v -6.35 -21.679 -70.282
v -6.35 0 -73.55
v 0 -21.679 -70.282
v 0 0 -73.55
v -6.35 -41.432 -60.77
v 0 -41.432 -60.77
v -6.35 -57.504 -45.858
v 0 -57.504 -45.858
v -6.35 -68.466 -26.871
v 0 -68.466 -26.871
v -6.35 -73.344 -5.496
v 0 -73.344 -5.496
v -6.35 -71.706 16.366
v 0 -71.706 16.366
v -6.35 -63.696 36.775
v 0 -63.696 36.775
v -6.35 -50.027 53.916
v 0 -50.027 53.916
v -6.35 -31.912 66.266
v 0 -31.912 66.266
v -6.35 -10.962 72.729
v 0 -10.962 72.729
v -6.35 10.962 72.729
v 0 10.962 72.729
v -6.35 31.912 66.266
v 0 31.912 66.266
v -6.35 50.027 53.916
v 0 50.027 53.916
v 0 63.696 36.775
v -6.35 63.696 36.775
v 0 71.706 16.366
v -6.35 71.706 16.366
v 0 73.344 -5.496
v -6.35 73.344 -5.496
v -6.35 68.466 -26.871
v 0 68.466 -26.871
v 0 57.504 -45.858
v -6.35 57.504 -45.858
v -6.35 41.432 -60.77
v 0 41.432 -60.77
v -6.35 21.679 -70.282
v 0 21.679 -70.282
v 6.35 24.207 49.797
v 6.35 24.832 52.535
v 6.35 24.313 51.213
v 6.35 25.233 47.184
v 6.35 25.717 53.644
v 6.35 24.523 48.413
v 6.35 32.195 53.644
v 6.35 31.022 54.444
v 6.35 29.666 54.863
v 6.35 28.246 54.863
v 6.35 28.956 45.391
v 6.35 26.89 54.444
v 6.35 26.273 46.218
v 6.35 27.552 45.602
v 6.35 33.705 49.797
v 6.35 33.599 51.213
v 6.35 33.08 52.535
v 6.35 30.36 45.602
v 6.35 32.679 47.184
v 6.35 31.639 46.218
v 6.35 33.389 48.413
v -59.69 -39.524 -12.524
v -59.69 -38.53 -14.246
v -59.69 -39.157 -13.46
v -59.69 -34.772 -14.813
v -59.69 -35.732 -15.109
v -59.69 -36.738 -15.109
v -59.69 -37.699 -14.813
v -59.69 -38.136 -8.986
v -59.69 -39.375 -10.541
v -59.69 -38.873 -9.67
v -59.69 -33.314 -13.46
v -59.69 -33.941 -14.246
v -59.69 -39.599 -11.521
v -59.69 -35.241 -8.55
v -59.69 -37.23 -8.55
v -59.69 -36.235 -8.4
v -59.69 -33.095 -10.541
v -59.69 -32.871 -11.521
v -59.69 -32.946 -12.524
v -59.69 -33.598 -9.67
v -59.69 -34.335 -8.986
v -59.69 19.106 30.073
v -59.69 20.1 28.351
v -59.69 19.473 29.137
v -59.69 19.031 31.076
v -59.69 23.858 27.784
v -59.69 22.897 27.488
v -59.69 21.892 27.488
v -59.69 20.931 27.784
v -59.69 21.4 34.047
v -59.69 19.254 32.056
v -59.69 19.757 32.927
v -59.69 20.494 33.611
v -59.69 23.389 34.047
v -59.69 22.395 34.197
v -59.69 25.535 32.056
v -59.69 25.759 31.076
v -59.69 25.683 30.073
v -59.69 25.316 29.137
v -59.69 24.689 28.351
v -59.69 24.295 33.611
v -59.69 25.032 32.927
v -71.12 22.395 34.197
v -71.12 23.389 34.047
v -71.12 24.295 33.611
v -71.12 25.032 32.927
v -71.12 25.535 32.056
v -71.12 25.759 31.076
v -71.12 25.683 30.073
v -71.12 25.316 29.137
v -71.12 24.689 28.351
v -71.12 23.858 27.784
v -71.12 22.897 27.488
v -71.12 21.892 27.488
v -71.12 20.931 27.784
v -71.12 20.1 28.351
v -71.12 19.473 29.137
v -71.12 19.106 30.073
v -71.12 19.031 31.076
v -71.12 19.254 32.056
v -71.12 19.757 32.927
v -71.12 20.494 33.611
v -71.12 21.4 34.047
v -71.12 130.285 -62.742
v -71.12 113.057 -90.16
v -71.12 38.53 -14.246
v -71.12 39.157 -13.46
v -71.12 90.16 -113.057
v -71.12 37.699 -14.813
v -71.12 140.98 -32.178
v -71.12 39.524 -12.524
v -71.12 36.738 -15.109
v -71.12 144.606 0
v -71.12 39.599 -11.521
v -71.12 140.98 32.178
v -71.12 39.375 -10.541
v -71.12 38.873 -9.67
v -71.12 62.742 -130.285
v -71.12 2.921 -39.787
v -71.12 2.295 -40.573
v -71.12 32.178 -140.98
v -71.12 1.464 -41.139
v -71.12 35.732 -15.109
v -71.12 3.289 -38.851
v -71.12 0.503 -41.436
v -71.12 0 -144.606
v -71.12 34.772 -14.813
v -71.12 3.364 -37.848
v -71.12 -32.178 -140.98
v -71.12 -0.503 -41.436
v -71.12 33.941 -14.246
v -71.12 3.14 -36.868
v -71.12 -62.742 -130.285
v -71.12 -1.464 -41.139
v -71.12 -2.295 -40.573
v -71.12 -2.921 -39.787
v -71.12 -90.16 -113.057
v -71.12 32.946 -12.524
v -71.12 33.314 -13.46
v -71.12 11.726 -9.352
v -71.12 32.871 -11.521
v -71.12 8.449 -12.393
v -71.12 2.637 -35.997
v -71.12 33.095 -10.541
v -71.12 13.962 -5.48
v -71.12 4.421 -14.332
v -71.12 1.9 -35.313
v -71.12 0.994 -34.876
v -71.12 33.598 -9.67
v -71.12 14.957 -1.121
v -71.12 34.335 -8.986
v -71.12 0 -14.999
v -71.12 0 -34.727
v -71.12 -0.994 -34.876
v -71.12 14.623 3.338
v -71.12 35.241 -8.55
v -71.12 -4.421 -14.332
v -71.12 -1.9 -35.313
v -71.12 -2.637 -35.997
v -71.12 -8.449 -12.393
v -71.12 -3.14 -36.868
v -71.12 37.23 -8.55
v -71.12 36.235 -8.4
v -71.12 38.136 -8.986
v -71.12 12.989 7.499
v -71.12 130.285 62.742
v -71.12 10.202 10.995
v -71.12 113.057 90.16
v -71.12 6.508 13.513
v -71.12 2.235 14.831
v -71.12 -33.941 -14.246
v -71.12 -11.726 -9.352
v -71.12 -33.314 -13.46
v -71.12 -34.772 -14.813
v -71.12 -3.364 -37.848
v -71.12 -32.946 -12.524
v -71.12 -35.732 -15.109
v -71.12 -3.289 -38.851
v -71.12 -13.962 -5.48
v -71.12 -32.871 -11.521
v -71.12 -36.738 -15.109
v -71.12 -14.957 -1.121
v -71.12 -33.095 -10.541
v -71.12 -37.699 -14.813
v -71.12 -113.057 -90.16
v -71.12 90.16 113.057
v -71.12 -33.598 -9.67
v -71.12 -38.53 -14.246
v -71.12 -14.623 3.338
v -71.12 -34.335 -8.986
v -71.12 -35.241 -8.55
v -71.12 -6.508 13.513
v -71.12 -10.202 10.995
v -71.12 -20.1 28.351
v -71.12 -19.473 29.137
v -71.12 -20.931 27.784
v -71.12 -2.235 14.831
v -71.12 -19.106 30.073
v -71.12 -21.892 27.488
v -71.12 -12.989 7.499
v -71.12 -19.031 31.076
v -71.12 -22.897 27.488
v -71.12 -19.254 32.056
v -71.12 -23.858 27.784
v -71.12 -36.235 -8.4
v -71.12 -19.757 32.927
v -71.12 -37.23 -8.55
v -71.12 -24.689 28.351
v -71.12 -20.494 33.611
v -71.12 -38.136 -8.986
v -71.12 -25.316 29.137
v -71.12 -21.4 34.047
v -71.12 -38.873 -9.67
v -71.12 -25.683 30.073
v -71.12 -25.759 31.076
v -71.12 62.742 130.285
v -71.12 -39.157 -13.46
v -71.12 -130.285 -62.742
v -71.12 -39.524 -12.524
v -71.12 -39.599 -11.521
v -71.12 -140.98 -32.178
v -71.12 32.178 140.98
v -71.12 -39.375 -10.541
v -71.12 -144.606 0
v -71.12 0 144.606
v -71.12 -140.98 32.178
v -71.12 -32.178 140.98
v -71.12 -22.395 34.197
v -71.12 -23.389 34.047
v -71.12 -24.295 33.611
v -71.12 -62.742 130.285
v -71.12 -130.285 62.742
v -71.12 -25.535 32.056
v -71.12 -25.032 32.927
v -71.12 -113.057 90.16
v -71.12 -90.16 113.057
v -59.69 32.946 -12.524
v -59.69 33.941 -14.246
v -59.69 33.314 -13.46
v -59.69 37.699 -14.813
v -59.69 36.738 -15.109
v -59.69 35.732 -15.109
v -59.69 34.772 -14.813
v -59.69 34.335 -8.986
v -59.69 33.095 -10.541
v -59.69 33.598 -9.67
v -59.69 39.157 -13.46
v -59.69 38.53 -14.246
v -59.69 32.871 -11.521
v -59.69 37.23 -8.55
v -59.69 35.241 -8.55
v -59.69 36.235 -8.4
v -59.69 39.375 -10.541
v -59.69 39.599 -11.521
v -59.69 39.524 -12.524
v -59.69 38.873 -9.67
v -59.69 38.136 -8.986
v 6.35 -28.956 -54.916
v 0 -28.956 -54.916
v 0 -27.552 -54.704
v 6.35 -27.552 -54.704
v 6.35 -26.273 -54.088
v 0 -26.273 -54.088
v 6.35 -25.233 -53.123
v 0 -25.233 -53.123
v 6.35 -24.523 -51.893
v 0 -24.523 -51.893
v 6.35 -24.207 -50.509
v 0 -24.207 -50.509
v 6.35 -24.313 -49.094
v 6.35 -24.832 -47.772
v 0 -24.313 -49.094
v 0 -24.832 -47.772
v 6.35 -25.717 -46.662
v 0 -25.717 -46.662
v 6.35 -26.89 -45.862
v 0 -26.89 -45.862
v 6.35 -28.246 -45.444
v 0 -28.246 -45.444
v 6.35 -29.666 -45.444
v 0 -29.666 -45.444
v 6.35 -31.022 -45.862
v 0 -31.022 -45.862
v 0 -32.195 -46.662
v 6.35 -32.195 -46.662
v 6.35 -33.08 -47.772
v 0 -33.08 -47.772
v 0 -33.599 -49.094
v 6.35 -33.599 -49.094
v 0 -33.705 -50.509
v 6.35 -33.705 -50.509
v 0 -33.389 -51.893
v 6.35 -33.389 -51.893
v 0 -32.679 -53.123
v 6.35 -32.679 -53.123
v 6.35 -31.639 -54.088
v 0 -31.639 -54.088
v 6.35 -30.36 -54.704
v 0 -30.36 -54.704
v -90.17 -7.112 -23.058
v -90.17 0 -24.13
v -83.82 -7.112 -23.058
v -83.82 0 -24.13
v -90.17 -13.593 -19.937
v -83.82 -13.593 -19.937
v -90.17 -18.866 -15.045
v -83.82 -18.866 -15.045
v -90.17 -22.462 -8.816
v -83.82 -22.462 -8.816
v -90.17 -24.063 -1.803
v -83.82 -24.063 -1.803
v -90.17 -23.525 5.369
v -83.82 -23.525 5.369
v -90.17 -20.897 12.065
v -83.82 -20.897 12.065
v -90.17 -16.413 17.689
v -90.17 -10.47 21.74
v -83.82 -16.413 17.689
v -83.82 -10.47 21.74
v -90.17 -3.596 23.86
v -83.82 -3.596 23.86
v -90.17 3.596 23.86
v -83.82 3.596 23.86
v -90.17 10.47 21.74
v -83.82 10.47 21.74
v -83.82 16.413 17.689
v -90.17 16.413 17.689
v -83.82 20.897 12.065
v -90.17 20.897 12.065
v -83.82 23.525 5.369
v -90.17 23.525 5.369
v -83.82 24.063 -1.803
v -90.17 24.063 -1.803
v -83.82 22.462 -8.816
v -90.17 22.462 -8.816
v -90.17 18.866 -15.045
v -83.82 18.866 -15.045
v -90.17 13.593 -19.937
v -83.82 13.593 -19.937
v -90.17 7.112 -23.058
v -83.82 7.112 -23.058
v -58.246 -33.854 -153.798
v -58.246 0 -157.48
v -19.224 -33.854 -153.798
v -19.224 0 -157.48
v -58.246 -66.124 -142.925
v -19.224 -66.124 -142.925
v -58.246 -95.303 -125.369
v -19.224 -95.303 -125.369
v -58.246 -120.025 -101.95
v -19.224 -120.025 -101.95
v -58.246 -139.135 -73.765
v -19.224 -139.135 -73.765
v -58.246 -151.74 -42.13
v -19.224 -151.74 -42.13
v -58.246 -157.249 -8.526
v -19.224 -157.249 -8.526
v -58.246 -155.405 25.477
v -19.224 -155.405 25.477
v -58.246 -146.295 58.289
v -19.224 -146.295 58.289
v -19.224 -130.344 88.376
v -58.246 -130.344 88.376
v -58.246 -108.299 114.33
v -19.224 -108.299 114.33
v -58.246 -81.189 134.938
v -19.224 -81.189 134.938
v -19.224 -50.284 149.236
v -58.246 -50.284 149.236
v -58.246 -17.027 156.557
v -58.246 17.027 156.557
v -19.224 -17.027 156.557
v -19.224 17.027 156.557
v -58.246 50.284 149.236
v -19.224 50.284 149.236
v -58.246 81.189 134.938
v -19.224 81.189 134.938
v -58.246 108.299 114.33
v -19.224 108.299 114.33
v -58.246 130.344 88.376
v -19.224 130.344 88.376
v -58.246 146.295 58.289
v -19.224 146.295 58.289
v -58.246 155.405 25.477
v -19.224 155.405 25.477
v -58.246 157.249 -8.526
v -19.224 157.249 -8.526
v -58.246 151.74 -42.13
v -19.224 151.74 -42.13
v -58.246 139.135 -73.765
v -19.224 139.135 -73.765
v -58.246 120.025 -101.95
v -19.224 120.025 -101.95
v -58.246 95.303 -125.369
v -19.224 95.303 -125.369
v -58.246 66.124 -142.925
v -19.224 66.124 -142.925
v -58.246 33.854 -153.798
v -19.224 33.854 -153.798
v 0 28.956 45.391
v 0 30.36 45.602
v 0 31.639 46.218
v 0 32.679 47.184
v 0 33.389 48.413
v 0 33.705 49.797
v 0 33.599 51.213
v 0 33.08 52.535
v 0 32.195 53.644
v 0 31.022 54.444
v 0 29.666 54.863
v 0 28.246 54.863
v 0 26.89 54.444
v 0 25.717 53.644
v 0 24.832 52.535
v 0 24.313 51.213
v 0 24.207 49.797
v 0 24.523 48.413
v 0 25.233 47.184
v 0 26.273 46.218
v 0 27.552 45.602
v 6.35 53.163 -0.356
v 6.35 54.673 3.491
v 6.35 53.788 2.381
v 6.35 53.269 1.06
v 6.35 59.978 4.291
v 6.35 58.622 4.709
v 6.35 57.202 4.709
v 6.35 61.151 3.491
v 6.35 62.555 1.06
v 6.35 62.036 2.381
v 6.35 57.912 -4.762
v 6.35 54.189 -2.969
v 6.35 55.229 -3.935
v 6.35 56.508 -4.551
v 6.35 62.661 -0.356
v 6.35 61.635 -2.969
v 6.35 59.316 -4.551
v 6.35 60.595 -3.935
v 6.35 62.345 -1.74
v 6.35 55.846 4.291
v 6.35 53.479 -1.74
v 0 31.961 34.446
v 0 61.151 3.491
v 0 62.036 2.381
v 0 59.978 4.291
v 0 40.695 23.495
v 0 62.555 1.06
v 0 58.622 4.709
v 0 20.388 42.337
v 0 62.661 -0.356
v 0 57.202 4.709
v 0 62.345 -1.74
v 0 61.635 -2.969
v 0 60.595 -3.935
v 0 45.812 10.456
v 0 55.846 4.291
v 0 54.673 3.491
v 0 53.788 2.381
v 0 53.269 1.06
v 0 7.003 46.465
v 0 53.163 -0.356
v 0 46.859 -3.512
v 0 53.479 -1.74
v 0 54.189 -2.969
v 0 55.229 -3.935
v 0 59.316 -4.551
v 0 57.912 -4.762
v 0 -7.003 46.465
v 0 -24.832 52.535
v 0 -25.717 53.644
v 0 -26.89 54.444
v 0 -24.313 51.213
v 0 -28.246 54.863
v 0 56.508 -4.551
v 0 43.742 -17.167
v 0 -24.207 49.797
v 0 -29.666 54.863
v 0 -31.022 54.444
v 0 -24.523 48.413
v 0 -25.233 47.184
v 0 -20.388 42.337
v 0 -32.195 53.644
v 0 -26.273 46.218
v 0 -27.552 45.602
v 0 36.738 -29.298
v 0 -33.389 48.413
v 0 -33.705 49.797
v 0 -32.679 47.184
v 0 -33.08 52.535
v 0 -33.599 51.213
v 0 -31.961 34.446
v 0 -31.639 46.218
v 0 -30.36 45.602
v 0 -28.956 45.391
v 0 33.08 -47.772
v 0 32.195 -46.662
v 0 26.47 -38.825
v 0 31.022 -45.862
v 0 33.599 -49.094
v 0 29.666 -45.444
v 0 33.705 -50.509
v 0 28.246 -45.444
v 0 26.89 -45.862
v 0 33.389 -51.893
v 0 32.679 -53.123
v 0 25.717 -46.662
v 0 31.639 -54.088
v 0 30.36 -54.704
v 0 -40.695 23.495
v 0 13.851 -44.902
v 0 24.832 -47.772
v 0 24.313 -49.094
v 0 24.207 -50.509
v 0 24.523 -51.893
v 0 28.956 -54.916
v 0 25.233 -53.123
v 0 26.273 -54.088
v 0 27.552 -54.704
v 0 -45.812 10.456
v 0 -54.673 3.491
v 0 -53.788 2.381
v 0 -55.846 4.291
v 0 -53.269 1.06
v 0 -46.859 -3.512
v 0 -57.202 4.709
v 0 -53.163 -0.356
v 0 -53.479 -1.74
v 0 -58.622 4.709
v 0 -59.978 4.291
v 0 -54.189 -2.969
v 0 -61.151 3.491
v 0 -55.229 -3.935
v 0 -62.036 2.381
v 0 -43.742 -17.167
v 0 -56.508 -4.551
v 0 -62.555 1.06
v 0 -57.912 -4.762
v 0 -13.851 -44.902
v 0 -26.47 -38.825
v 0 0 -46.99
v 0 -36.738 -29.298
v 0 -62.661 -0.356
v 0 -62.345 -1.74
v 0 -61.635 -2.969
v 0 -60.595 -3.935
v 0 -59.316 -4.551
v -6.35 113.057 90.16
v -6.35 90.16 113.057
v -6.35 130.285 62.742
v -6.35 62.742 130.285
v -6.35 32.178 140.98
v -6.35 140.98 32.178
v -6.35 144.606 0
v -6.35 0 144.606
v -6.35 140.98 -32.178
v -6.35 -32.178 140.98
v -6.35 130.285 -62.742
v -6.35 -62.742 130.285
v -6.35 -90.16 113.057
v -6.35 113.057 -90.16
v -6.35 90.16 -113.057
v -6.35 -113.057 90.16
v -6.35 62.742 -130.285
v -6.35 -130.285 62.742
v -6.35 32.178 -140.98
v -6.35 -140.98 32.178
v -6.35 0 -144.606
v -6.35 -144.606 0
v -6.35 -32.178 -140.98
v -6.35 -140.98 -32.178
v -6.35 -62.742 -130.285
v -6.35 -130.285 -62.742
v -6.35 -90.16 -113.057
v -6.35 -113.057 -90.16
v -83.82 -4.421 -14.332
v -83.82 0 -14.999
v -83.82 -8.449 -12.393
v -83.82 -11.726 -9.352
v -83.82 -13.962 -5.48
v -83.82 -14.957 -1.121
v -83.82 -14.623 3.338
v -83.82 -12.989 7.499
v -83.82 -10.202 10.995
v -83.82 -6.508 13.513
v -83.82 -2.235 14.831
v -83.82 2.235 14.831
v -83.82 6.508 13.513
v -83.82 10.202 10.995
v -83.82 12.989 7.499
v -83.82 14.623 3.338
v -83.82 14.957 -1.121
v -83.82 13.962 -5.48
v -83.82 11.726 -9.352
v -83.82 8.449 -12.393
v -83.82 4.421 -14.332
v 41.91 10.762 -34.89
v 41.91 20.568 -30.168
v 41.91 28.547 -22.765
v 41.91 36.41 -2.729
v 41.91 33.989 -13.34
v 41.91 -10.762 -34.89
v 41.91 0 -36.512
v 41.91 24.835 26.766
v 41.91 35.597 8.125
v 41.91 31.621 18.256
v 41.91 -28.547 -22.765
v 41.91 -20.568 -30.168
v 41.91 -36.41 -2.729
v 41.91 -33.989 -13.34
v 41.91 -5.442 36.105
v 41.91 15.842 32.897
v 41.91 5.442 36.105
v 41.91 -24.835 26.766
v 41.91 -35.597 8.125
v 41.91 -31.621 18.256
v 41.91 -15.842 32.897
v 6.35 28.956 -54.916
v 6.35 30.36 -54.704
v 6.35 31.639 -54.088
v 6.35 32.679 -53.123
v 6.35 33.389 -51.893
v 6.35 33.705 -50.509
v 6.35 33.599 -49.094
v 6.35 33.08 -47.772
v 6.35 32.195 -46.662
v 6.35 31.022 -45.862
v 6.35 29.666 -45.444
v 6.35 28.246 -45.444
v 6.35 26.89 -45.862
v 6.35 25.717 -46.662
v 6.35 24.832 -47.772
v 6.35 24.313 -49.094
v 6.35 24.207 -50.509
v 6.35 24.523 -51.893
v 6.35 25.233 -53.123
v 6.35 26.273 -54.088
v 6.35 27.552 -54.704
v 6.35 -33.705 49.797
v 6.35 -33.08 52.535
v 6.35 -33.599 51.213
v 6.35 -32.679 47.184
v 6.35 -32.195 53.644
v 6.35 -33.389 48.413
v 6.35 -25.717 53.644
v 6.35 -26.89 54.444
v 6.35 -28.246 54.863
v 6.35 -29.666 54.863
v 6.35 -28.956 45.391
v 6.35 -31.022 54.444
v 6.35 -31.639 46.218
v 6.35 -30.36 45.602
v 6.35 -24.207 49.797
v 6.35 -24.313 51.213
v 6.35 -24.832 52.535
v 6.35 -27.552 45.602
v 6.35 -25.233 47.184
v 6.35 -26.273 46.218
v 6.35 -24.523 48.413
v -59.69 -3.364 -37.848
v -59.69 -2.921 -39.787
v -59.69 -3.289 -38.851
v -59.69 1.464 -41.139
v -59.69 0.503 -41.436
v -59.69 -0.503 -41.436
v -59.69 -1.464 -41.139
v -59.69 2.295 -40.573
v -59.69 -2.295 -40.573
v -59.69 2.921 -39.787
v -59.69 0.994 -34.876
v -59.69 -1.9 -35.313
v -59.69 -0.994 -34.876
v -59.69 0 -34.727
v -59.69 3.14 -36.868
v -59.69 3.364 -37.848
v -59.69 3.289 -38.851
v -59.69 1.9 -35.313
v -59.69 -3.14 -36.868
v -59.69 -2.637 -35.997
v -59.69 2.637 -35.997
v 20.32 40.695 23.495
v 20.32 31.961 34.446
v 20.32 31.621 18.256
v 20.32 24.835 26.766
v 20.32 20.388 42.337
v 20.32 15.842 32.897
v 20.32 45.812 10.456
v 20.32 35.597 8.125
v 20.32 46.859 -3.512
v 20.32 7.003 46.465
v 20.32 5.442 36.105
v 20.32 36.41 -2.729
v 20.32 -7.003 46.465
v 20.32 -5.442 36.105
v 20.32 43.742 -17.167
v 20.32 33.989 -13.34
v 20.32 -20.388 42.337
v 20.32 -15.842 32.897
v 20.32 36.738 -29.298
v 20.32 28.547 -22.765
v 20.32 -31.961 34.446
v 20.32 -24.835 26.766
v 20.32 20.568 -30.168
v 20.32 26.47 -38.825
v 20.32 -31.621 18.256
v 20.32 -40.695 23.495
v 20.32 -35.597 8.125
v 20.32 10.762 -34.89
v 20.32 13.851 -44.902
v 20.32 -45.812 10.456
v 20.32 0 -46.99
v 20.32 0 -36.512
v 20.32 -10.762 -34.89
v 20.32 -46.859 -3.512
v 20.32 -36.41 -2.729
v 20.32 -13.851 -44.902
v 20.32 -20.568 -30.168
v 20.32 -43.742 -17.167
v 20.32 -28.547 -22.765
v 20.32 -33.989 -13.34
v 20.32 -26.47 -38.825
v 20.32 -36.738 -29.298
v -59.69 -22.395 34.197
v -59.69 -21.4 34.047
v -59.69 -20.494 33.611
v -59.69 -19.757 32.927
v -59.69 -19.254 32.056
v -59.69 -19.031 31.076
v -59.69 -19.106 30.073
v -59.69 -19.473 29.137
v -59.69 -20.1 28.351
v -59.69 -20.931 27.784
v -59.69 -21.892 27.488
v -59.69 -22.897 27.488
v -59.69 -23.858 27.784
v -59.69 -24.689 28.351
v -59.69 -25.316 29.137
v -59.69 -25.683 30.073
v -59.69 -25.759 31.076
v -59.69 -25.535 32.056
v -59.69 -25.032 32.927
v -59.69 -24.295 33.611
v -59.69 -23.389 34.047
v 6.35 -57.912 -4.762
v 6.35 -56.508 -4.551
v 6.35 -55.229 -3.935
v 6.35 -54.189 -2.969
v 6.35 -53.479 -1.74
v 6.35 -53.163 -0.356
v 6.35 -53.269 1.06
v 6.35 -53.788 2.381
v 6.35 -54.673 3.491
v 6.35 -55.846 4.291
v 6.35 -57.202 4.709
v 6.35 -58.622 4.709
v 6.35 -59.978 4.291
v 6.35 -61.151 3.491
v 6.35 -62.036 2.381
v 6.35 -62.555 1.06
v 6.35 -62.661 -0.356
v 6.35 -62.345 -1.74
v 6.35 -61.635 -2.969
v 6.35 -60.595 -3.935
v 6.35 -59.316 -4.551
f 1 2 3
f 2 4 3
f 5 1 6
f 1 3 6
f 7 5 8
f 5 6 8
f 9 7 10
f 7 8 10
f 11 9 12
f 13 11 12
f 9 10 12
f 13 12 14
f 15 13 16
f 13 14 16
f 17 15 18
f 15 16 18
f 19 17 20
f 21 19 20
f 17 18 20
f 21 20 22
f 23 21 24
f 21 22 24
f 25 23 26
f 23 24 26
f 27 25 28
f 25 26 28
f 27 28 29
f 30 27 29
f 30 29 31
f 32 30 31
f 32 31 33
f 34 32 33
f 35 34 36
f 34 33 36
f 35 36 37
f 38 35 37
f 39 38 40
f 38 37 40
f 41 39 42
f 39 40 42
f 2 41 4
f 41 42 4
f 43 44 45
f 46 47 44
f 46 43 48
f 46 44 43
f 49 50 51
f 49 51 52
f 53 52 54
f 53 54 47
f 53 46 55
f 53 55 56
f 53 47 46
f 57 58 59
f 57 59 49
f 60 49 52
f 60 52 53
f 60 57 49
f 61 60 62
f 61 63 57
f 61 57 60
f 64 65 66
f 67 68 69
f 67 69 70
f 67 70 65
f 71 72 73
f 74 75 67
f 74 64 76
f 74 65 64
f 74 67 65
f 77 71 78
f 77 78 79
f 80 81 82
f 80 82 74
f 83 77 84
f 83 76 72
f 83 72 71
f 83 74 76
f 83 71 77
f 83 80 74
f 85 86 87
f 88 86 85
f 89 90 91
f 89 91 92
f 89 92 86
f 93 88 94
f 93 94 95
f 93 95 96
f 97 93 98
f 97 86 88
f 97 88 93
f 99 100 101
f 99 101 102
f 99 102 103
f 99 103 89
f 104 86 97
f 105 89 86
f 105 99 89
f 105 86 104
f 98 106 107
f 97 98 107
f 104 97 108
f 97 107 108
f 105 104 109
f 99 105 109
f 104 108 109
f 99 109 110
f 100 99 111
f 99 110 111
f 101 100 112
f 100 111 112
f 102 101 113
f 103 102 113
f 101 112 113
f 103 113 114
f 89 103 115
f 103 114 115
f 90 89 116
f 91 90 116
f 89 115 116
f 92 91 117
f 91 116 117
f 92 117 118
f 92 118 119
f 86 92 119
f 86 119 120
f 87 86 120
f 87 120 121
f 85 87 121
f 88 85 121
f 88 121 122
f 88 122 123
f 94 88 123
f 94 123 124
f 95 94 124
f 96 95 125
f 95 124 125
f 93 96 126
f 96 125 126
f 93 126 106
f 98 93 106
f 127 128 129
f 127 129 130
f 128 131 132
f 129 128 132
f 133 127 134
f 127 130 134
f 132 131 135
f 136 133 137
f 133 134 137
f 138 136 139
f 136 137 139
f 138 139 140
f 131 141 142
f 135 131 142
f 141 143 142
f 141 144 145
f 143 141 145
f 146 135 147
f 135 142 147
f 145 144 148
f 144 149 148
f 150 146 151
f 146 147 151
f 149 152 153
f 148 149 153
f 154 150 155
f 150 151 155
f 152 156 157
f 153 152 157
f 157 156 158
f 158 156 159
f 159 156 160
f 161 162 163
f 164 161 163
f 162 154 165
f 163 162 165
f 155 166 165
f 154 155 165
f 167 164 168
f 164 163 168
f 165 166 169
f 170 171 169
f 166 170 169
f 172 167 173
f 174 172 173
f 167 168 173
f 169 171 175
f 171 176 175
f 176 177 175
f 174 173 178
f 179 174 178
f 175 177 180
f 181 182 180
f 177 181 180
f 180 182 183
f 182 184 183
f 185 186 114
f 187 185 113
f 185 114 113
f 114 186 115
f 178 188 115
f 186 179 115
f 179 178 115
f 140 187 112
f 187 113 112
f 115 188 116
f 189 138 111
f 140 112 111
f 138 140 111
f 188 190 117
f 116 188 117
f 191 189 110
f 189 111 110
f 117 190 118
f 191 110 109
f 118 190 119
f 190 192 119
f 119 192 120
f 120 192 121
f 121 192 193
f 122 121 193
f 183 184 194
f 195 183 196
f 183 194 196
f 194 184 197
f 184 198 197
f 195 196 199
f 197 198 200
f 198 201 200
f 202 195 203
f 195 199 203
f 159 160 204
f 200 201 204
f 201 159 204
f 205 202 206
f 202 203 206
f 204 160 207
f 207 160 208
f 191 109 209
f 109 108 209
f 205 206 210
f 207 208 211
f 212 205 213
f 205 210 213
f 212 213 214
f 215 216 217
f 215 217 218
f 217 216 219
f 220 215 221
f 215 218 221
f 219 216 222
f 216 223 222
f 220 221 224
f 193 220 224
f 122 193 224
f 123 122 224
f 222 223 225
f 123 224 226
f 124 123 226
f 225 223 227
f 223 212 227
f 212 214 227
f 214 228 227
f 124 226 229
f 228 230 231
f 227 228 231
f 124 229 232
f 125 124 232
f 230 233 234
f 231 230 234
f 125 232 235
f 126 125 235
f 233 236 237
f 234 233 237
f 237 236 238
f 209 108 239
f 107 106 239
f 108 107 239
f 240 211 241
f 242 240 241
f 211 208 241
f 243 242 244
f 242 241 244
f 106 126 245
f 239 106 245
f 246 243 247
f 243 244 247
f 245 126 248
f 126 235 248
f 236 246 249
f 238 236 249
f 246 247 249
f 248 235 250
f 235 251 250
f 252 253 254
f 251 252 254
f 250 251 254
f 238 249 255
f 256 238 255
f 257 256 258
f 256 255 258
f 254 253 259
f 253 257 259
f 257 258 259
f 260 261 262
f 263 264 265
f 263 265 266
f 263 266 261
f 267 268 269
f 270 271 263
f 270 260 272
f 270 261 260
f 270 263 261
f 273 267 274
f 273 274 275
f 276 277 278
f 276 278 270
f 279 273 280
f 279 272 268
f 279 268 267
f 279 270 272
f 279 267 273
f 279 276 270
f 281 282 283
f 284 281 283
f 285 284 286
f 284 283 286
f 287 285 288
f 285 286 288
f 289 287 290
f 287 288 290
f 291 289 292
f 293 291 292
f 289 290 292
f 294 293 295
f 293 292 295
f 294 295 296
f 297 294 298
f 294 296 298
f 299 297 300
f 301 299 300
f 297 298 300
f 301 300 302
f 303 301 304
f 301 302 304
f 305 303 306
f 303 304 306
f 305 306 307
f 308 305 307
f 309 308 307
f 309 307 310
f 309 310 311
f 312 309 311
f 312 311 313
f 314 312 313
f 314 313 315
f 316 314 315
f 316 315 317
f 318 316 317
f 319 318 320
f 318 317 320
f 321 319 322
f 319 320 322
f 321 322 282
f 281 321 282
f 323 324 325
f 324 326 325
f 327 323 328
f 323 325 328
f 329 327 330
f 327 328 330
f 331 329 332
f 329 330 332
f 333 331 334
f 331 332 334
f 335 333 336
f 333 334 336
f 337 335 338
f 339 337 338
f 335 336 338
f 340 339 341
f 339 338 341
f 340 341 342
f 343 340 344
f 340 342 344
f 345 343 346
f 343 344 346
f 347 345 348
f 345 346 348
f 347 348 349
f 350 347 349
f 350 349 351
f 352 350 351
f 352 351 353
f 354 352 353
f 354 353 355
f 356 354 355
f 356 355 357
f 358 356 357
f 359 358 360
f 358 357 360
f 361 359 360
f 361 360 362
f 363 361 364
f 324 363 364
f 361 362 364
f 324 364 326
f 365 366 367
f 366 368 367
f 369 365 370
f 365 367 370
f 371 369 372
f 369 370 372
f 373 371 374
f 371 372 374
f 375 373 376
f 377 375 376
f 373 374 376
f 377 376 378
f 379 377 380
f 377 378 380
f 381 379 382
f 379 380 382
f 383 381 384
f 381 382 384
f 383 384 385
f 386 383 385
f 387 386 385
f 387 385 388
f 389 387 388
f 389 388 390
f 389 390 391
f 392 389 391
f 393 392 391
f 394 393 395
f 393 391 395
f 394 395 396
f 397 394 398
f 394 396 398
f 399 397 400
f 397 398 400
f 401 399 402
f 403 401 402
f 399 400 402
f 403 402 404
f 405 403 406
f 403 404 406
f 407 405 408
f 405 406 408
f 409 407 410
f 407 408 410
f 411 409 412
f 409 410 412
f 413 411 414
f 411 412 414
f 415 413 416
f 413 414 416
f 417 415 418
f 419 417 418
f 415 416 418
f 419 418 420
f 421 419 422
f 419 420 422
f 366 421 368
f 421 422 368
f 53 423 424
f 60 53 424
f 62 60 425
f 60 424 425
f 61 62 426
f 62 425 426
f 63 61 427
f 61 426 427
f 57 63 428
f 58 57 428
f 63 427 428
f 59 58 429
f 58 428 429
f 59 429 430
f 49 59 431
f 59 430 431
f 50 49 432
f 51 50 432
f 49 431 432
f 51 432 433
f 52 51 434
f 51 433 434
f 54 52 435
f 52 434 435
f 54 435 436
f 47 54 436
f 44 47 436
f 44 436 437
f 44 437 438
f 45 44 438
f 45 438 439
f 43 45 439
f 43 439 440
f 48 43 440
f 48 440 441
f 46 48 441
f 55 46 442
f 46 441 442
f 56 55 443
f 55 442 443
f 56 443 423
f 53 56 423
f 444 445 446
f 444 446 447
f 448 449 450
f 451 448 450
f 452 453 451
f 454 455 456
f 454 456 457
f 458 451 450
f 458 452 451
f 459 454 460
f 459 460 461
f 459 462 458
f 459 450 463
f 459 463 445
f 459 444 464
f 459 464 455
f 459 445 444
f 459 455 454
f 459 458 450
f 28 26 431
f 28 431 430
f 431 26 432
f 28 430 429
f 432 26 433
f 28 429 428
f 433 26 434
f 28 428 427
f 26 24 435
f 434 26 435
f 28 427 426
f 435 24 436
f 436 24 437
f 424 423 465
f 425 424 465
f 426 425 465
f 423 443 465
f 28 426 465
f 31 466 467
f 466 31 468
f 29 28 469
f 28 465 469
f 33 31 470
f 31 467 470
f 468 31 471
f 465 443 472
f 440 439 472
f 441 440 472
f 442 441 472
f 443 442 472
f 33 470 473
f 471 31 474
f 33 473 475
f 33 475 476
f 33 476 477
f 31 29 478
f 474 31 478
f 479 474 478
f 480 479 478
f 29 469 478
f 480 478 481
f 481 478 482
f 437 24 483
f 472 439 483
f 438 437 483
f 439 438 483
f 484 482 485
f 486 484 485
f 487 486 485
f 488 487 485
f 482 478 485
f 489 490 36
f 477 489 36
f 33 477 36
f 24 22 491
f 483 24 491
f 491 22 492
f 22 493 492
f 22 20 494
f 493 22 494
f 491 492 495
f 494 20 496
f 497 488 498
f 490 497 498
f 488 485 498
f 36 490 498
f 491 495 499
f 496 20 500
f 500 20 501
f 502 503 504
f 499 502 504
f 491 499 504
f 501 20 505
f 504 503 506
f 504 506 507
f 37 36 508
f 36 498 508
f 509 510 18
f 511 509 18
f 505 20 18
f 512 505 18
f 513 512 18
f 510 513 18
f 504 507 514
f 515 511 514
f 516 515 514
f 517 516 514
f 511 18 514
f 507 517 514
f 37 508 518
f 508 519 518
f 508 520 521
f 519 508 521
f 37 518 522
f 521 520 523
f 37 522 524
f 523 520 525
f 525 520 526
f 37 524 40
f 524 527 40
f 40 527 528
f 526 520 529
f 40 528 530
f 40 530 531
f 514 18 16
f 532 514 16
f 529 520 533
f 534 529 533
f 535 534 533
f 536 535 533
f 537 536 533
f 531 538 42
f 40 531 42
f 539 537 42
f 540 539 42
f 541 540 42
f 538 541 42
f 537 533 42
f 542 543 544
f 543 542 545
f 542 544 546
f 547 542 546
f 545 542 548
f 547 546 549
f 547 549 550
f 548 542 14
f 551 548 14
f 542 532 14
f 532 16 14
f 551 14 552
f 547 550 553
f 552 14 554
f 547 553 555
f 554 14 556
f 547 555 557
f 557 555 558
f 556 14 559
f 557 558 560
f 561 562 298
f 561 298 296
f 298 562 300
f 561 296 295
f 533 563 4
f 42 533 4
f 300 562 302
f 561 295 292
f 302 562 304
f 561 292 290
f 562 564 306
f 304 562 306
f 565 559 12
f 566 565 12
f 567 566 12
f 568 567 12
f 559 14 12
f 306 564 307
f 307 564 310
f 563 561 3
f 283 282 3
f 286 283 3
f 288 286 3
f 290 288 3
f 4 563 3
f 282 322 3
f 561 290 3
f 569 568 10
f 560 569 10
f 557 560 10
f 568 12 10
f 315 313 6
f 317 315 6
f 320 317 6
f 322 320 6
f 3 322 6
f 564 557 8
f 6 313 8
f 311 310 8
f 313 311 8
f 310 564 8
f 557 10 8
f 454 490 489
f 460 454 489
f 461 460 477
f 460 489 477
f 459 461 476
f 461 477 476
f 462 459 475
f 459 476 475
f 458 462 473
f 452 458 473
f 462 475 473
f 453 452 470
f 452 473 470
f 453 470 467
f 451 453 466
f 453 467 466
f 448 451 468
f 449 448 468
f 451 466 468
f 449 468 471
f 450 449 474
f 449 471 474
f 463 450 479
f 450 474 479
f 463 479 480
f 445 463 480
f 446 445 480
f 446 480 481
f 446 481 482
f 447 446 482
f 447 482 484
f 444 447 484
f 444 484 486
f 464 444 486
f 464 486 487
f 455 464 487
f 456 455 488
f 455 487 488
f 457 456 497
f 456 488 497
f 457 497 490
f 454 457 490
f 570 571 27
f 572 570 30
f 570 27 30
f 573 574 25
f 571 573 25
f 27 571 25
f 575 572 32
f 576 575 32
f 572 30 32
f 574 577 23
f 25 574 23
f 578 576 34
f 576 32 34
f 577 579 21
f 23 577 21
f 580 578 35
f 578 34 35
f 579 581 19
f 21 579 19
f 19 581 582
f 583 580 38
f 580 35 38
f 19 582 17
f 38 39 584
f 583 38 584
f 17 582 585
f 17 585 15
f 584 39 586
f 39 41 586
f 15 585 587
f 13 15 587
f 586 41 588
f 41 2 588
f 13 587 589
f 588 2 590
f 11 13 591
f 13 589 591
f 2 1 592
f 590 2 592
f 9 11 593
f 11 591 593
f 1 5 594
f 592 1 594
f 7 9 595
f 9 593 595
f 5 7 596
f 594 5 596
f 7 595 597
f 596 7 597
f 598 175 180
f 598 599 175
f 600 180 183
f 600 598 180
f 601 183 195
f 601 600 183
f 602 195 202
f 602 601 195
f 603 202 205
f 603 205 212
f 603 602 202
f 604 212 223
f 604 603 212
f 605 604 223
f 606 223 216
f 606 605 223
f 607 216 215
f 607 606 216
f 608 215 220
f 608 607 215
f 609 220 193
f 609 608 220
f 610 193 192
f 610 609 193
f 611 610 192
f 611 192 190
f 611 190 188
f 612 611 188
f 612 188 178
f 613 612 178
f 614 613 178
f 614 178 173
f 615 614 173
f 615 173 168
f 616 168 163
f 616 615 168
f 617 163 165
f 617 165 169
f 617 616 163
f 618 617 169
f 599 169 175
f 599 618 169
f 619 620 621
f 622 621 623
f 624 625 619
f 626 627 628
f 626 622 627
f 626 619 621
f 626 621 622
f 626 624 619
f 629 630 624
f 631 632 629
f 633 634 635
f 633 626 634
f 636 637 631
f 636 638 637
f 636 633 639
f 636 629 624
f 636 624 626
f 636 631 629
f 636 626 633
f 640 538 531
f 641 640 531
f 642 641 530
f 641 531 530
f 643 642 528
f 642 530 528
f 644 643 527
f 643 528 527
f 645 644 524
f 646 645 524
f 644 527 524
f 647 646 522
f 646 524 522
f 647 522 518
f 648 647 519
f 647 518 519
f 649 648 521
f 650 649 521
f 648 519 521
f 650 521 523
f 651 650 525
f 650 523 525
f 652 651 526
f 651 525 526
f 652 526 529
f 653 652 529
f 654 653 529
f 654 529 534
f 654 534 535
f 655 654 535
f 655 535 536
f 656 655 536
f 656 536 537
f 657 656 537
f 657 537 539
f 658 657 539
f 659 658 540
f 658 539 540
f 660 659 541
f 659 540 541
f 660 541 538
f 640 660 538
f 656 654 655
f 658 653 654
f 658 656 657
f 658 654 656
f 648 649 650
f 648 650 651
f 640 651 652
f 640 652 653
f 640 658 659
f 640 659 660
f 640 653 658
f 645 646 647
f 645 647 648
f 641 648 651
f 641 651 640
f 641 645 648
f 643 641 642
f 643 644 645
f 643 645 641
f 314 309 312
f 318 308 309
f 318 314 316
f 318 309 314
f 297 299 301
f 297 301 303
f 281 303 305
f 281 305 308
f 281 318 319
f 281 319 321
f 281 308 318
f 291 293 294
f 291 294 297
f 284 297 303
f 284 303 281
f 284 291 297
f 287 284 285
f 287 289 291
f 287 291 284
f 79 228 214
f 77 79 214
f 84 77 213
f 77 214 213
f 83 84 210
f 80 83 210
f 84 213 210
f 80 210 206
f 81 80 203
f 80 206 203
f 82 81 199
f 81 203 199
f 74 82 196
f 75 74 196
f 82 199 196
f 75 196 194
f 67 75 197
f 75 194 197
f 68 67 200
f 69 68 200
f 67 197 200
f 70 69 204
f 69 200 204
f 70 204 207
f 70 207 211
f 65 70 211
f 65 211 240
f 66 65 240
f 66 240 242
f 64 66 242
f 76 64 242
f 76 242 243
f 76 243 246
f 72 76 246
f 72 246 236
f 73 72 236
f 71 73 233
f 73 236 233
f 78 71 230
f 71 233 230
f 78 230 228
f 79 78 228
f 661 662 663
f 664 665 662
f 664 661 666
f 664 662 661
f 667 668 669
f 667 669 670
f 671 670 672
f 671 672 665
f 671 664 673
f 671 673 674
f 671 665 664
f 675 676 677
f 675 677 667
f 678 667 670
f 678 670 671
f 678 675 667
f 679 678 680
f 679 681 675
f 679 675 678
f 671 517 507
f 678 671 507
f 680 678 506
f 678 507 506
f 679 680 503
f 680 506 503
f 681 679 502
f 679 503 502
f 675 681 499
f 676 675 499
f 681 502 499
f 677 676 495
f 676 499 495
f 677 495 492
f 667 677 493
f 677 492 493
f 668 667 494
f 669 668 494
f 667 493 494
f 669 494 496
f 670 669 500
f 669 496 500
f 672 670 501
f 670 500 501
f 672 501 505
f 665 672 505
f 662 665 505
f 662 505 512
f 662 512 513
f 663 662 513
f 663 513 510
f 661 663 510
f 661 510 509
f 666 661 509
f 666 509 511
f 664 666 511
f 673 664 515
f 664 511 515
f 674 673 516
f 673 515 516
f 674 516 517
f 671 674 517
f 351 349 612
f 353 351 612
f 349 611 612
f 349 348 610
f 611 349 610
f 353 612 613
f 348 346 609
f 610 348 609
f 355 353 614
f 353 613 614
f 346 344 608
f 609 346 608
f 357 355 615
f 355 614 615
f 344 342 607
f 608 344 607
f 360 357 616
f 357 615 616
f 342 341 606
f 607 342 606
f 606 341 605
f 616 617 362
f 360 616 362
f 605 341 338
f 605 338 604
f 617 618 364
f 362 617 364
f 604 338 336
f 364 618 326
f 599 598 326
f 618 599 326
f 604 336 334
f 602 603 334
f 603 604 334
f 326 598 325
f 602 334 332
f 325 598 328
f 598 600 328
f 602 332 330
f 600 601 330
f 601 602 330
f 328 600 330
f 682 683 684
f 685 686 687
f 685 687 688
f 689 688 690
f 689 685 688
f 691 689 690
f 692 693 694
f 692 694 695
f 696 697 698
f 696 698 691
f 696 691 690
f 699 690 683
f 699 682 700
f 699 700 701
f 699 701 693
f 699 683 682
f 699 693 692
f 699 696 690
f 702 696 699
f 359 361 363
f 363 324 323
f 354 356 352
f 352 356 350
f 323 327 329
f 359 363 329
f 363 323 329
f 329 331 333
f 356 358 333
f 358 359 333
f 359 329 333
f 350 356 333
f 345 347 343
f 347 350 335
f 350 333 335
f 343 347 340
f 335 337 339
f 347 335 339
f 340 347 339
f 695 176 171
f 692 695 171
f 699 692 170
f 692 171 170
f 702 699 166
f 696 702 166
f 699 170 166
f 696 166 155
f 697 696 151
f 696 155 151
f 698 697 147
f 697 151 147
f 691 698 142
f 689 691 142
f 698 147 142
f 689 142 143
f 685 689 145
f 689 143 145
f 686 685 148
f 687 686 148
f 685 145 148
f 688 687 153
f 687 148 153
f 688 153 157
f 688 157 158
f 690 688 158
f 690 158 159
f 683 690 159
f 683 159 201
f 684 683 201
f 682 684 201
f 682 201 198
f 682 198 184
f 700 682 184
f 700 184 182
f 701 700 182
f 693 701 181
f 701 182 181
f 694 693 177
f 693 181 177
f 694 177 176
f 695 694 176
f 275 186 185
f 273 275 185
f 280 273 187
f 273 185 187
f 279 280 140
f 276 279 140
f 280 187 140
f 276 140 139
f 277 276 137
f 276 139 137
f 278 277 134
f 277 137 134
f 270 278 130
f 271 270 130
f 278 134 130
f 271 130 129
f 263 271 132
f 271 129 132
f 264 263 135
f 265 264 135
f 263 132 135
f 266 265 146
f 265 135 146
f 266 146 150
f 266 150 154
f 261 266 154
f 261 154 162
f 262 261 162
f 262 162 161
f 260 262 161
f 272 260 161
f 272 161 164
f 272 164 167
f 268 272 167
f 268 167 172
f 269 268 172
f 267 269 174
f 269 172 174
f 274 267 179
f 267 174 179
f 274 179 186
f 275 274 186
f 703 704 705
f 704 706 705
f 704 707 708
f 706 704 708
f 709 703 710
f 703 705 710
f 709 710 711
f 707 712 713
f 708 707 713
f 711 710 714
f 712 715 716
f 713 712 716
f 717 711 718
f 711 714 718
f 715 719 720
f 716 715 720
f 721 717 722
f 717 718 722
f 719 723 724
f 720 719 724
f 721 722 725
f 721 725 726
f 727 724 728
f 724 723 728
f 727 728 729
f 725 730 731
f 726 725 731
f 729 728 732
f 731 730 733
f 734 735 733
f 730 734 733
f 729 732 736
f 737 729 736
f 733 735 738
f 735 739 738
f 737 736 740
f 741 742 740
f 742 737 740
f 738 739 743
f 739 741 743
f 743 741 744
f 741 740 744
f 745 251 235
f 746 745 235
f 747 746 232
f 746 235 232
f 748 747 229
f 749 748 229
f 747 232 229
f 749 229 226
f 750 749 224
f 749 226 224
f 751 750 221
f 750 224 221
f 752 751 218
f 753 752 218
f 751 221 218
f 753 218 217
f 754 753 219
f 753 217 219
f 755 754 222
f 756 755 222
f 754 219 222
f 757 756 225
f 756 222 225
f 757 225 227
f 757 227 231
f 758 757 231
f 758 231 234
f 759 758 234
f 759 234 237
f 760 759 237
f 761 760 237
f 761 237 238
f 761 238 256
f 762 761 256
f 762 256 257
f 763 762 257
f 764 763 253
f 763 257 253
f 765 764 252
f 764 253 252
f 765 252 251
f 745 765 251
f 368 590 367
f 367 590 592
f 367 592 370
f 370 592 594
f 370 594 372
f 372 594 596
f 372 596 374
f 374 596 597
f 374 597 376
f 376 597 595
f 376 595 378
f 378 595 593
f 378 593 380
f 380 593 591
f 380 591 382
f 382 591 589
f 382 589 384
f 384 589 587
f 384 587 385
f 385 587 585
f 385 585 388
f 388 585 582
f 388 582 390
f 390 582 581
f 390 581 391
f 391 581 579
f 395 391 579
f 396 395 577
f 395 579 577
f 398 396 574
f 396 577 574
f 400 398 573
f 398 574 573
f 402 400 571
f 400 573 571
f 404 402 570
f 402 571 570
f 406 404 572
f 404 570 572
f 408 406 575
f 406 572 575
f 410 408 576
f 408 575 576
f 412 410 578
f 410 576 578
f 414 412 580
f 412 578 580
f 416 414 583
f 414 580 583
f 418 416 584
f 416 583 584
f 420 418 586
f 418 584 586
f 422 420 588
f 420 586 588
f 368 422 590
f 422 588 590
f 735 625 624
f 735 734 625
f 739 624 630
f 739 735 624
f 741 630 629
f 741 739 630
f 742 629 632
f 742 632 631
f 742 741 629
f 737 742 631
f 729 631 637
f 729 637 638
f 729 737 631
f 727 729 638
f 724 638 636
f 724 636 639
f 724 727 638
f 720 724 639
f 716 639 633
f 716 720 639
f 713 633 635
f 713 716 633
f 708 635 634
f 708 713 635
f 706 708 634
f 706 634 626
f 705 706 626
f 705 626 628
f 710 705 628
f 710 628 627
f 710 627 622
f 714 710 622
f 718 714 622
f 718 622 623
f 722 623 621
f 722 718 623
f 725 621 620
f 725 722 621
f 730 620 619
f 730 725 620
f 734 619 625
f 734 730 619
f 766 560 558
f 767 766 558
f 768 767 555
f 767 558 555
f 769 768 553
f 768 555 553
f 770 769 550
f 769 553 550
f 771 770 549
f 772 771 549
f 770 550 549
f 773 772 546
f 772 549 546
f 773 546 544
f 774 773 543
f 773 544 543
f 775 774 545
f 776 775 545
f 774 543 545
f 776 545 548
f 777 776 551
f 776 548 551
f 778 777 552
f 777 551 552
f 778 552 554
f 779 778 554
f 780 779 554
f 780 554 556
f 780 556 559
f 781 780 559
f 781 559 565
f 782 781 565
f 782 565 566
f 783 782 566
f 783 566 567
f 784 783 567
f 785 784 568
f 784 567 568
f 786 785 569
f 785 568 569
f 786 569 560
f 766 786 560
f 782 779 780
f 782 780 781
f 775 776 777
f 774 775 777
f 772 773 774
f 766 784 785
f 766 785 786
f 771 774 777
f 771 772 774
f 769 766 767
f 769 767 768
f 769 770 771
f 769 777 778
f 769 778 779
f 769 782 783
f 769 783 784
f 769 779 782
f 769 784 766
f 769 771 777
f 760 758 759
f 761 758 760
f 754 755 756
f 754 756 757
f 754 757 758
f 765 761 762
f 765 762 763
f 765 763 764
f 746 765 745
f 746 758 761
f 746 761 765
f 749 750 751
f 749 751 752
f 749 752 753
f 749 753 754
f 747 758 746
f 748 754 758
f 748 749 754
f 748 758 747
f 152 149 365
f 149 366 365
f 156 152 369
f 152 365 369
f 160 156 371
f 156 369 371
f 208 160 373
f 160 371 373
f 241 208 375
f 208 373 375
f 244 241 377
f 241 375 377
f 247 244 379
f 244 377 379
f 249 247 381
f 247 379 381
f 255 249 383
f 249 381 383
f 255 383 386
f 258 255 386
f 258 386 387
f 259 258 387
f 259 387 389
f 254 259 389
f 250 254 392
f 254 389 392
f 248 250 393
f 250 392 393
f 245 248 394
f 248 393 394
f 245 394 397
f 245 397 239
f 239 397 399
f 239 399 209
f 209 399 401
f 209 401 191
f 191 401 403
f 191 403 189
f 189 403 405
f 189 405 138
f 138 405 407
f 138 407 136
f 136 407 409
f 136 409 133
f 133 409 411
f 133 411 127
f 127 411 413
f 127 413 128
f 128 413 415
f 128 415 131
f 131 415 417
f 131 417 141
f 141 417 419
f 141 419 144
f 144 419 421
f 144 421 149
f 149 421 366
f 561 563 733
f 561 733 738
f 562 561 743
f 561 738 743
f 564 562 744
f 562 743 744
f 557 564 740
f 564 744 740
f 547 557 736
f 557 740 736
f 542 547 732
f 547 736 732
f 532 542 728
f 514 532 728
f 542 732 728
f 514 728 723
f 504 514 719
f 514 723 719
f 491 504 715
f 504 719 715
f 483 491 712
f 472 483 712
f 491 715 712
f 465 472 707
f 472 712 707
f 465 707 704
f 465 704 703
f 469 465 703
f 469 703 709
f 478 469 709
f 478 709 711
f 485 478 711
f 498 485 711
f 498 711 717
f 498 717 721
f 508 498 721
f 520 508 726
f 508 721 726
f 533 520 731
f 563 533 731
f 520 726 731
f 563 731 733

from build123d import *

# Parameters (mm, degrees)
SKETCH1_W           = 12.7
SKETCH1_H           = 14.9987
SKETCH1_W_2         = 21.59
SKETCH1_H_2         = 36.5125
SKETCH3_R           = 3.3734375
CUT_EXTRUDE1_DEPTH  = 11.43
SKETCH5_R           = 4.7625
BOSS_EXTRUDE1_DEPTH = 6.35


with BuildPart() as part:
    # Sketch1 → Revolve1 (revolve)
    with BuildSketch(Plane(origin=(0, 0, 0), x_dir=(-1, 0, 0), z_dir=(0, 1, 0)), mode=Mode.PRIVATE) as revolve1_sk:
        Polygon((0, 0), (0, 46.99), (-20.32, 46.99), (-20.32, 36.5125), (-20.32, 0), align=None)
        Polygon((6.35, 73.550123262), (0, 73.550123262), (0, 46.99), (0, 0), (71.12, 0), (71.12, 14.9987), (71.12, 144.605660924), (58.245660924, 157.48), (19.224339076, 157.48), (6.35, 144.605660924), align=None)
        with Locations((77.47, 7.49935)):
            Rectangle(SKETCH1_W, SKETCH1_H)
        Polygon((83.82, 14.9987), (83.82, 0), (90.17, 0), (90.17, 24.13), (83.82, 24.13), align=None)
        with Locations((-31.115, 18.25625)):
            Rectangle(SKETCH1_W_2, SKETCH1_H_2)
    revolve(revolve1_sk.sketch.rotate(Axis((0, 0, 0), (-1, 0, 0)), 180), axis=Axis((0, 0, 0), (-1, 0, 0)))

    # Sketch3 → Cut-Extrude1 (cut)
    with BuildSketch(Plane(origin=(-71.12, 0, 0), x_dir=(0, -1, 0), z_dir=(-1, 0, 0))):
        with Locations(Location((-22.394618112, 30.823547486, 0), (0, 0, 90))):
            Circle(SKETCH3_R)
        with Locations(Location((22.394618112, 30.823547486, 0), (0, 0, 90))):
            Circle(SKETCH3_R)
        with Locations(Location((36.235253271, -11.773547486, 0), (0, 0, 90))):
            Circle(SKETCH3_R)
        with Locations(Location((0, -38.1, 0), (0, 0, 90))):
            Circle(SKETCH3_R)
        with Locations(Location((-36.235253271, -11.773547486, 0), (0, 0, 90))):
            Circle(SKETCH3_R)
    extrude(amount=-CUT_EXTRUDE1_DEPTH, mode=Mode.SUBTRACT)

    # Sketch5 → Boss-Extrude1 (add)
    with BuildSketch(Plane.YZ):
        with Locations(Location((28.956, 50.153263184, 0), (0, 0, 270))):
            Circle(SKETCH5_R)
        with Locations(Location((-28.956, 50.153263184, 0), (0, 0, 270))):
            Circle(SKETCH5_R)
        with Locations(Location((-57.912, 0, 0), (0, 0, 270))):
            Circle(SKETCH5_R)
        with Locations(Location((-28.956, -50.153263184, 0), (0, 0, 270))):
            Circle(SKETCH5_R)
        with Locations(Location((28.956, -50.153263184, 0), (0, 0, 270))):
            Circle(SKETCH5_R)
        with Locations(Location((57.912, 0, 0), (0, 0, 270))):
            Circle(SKETCH5_R)
    extrude(amount=BOSS_EXTRUDE1_DEPTH)


solid = part.part
